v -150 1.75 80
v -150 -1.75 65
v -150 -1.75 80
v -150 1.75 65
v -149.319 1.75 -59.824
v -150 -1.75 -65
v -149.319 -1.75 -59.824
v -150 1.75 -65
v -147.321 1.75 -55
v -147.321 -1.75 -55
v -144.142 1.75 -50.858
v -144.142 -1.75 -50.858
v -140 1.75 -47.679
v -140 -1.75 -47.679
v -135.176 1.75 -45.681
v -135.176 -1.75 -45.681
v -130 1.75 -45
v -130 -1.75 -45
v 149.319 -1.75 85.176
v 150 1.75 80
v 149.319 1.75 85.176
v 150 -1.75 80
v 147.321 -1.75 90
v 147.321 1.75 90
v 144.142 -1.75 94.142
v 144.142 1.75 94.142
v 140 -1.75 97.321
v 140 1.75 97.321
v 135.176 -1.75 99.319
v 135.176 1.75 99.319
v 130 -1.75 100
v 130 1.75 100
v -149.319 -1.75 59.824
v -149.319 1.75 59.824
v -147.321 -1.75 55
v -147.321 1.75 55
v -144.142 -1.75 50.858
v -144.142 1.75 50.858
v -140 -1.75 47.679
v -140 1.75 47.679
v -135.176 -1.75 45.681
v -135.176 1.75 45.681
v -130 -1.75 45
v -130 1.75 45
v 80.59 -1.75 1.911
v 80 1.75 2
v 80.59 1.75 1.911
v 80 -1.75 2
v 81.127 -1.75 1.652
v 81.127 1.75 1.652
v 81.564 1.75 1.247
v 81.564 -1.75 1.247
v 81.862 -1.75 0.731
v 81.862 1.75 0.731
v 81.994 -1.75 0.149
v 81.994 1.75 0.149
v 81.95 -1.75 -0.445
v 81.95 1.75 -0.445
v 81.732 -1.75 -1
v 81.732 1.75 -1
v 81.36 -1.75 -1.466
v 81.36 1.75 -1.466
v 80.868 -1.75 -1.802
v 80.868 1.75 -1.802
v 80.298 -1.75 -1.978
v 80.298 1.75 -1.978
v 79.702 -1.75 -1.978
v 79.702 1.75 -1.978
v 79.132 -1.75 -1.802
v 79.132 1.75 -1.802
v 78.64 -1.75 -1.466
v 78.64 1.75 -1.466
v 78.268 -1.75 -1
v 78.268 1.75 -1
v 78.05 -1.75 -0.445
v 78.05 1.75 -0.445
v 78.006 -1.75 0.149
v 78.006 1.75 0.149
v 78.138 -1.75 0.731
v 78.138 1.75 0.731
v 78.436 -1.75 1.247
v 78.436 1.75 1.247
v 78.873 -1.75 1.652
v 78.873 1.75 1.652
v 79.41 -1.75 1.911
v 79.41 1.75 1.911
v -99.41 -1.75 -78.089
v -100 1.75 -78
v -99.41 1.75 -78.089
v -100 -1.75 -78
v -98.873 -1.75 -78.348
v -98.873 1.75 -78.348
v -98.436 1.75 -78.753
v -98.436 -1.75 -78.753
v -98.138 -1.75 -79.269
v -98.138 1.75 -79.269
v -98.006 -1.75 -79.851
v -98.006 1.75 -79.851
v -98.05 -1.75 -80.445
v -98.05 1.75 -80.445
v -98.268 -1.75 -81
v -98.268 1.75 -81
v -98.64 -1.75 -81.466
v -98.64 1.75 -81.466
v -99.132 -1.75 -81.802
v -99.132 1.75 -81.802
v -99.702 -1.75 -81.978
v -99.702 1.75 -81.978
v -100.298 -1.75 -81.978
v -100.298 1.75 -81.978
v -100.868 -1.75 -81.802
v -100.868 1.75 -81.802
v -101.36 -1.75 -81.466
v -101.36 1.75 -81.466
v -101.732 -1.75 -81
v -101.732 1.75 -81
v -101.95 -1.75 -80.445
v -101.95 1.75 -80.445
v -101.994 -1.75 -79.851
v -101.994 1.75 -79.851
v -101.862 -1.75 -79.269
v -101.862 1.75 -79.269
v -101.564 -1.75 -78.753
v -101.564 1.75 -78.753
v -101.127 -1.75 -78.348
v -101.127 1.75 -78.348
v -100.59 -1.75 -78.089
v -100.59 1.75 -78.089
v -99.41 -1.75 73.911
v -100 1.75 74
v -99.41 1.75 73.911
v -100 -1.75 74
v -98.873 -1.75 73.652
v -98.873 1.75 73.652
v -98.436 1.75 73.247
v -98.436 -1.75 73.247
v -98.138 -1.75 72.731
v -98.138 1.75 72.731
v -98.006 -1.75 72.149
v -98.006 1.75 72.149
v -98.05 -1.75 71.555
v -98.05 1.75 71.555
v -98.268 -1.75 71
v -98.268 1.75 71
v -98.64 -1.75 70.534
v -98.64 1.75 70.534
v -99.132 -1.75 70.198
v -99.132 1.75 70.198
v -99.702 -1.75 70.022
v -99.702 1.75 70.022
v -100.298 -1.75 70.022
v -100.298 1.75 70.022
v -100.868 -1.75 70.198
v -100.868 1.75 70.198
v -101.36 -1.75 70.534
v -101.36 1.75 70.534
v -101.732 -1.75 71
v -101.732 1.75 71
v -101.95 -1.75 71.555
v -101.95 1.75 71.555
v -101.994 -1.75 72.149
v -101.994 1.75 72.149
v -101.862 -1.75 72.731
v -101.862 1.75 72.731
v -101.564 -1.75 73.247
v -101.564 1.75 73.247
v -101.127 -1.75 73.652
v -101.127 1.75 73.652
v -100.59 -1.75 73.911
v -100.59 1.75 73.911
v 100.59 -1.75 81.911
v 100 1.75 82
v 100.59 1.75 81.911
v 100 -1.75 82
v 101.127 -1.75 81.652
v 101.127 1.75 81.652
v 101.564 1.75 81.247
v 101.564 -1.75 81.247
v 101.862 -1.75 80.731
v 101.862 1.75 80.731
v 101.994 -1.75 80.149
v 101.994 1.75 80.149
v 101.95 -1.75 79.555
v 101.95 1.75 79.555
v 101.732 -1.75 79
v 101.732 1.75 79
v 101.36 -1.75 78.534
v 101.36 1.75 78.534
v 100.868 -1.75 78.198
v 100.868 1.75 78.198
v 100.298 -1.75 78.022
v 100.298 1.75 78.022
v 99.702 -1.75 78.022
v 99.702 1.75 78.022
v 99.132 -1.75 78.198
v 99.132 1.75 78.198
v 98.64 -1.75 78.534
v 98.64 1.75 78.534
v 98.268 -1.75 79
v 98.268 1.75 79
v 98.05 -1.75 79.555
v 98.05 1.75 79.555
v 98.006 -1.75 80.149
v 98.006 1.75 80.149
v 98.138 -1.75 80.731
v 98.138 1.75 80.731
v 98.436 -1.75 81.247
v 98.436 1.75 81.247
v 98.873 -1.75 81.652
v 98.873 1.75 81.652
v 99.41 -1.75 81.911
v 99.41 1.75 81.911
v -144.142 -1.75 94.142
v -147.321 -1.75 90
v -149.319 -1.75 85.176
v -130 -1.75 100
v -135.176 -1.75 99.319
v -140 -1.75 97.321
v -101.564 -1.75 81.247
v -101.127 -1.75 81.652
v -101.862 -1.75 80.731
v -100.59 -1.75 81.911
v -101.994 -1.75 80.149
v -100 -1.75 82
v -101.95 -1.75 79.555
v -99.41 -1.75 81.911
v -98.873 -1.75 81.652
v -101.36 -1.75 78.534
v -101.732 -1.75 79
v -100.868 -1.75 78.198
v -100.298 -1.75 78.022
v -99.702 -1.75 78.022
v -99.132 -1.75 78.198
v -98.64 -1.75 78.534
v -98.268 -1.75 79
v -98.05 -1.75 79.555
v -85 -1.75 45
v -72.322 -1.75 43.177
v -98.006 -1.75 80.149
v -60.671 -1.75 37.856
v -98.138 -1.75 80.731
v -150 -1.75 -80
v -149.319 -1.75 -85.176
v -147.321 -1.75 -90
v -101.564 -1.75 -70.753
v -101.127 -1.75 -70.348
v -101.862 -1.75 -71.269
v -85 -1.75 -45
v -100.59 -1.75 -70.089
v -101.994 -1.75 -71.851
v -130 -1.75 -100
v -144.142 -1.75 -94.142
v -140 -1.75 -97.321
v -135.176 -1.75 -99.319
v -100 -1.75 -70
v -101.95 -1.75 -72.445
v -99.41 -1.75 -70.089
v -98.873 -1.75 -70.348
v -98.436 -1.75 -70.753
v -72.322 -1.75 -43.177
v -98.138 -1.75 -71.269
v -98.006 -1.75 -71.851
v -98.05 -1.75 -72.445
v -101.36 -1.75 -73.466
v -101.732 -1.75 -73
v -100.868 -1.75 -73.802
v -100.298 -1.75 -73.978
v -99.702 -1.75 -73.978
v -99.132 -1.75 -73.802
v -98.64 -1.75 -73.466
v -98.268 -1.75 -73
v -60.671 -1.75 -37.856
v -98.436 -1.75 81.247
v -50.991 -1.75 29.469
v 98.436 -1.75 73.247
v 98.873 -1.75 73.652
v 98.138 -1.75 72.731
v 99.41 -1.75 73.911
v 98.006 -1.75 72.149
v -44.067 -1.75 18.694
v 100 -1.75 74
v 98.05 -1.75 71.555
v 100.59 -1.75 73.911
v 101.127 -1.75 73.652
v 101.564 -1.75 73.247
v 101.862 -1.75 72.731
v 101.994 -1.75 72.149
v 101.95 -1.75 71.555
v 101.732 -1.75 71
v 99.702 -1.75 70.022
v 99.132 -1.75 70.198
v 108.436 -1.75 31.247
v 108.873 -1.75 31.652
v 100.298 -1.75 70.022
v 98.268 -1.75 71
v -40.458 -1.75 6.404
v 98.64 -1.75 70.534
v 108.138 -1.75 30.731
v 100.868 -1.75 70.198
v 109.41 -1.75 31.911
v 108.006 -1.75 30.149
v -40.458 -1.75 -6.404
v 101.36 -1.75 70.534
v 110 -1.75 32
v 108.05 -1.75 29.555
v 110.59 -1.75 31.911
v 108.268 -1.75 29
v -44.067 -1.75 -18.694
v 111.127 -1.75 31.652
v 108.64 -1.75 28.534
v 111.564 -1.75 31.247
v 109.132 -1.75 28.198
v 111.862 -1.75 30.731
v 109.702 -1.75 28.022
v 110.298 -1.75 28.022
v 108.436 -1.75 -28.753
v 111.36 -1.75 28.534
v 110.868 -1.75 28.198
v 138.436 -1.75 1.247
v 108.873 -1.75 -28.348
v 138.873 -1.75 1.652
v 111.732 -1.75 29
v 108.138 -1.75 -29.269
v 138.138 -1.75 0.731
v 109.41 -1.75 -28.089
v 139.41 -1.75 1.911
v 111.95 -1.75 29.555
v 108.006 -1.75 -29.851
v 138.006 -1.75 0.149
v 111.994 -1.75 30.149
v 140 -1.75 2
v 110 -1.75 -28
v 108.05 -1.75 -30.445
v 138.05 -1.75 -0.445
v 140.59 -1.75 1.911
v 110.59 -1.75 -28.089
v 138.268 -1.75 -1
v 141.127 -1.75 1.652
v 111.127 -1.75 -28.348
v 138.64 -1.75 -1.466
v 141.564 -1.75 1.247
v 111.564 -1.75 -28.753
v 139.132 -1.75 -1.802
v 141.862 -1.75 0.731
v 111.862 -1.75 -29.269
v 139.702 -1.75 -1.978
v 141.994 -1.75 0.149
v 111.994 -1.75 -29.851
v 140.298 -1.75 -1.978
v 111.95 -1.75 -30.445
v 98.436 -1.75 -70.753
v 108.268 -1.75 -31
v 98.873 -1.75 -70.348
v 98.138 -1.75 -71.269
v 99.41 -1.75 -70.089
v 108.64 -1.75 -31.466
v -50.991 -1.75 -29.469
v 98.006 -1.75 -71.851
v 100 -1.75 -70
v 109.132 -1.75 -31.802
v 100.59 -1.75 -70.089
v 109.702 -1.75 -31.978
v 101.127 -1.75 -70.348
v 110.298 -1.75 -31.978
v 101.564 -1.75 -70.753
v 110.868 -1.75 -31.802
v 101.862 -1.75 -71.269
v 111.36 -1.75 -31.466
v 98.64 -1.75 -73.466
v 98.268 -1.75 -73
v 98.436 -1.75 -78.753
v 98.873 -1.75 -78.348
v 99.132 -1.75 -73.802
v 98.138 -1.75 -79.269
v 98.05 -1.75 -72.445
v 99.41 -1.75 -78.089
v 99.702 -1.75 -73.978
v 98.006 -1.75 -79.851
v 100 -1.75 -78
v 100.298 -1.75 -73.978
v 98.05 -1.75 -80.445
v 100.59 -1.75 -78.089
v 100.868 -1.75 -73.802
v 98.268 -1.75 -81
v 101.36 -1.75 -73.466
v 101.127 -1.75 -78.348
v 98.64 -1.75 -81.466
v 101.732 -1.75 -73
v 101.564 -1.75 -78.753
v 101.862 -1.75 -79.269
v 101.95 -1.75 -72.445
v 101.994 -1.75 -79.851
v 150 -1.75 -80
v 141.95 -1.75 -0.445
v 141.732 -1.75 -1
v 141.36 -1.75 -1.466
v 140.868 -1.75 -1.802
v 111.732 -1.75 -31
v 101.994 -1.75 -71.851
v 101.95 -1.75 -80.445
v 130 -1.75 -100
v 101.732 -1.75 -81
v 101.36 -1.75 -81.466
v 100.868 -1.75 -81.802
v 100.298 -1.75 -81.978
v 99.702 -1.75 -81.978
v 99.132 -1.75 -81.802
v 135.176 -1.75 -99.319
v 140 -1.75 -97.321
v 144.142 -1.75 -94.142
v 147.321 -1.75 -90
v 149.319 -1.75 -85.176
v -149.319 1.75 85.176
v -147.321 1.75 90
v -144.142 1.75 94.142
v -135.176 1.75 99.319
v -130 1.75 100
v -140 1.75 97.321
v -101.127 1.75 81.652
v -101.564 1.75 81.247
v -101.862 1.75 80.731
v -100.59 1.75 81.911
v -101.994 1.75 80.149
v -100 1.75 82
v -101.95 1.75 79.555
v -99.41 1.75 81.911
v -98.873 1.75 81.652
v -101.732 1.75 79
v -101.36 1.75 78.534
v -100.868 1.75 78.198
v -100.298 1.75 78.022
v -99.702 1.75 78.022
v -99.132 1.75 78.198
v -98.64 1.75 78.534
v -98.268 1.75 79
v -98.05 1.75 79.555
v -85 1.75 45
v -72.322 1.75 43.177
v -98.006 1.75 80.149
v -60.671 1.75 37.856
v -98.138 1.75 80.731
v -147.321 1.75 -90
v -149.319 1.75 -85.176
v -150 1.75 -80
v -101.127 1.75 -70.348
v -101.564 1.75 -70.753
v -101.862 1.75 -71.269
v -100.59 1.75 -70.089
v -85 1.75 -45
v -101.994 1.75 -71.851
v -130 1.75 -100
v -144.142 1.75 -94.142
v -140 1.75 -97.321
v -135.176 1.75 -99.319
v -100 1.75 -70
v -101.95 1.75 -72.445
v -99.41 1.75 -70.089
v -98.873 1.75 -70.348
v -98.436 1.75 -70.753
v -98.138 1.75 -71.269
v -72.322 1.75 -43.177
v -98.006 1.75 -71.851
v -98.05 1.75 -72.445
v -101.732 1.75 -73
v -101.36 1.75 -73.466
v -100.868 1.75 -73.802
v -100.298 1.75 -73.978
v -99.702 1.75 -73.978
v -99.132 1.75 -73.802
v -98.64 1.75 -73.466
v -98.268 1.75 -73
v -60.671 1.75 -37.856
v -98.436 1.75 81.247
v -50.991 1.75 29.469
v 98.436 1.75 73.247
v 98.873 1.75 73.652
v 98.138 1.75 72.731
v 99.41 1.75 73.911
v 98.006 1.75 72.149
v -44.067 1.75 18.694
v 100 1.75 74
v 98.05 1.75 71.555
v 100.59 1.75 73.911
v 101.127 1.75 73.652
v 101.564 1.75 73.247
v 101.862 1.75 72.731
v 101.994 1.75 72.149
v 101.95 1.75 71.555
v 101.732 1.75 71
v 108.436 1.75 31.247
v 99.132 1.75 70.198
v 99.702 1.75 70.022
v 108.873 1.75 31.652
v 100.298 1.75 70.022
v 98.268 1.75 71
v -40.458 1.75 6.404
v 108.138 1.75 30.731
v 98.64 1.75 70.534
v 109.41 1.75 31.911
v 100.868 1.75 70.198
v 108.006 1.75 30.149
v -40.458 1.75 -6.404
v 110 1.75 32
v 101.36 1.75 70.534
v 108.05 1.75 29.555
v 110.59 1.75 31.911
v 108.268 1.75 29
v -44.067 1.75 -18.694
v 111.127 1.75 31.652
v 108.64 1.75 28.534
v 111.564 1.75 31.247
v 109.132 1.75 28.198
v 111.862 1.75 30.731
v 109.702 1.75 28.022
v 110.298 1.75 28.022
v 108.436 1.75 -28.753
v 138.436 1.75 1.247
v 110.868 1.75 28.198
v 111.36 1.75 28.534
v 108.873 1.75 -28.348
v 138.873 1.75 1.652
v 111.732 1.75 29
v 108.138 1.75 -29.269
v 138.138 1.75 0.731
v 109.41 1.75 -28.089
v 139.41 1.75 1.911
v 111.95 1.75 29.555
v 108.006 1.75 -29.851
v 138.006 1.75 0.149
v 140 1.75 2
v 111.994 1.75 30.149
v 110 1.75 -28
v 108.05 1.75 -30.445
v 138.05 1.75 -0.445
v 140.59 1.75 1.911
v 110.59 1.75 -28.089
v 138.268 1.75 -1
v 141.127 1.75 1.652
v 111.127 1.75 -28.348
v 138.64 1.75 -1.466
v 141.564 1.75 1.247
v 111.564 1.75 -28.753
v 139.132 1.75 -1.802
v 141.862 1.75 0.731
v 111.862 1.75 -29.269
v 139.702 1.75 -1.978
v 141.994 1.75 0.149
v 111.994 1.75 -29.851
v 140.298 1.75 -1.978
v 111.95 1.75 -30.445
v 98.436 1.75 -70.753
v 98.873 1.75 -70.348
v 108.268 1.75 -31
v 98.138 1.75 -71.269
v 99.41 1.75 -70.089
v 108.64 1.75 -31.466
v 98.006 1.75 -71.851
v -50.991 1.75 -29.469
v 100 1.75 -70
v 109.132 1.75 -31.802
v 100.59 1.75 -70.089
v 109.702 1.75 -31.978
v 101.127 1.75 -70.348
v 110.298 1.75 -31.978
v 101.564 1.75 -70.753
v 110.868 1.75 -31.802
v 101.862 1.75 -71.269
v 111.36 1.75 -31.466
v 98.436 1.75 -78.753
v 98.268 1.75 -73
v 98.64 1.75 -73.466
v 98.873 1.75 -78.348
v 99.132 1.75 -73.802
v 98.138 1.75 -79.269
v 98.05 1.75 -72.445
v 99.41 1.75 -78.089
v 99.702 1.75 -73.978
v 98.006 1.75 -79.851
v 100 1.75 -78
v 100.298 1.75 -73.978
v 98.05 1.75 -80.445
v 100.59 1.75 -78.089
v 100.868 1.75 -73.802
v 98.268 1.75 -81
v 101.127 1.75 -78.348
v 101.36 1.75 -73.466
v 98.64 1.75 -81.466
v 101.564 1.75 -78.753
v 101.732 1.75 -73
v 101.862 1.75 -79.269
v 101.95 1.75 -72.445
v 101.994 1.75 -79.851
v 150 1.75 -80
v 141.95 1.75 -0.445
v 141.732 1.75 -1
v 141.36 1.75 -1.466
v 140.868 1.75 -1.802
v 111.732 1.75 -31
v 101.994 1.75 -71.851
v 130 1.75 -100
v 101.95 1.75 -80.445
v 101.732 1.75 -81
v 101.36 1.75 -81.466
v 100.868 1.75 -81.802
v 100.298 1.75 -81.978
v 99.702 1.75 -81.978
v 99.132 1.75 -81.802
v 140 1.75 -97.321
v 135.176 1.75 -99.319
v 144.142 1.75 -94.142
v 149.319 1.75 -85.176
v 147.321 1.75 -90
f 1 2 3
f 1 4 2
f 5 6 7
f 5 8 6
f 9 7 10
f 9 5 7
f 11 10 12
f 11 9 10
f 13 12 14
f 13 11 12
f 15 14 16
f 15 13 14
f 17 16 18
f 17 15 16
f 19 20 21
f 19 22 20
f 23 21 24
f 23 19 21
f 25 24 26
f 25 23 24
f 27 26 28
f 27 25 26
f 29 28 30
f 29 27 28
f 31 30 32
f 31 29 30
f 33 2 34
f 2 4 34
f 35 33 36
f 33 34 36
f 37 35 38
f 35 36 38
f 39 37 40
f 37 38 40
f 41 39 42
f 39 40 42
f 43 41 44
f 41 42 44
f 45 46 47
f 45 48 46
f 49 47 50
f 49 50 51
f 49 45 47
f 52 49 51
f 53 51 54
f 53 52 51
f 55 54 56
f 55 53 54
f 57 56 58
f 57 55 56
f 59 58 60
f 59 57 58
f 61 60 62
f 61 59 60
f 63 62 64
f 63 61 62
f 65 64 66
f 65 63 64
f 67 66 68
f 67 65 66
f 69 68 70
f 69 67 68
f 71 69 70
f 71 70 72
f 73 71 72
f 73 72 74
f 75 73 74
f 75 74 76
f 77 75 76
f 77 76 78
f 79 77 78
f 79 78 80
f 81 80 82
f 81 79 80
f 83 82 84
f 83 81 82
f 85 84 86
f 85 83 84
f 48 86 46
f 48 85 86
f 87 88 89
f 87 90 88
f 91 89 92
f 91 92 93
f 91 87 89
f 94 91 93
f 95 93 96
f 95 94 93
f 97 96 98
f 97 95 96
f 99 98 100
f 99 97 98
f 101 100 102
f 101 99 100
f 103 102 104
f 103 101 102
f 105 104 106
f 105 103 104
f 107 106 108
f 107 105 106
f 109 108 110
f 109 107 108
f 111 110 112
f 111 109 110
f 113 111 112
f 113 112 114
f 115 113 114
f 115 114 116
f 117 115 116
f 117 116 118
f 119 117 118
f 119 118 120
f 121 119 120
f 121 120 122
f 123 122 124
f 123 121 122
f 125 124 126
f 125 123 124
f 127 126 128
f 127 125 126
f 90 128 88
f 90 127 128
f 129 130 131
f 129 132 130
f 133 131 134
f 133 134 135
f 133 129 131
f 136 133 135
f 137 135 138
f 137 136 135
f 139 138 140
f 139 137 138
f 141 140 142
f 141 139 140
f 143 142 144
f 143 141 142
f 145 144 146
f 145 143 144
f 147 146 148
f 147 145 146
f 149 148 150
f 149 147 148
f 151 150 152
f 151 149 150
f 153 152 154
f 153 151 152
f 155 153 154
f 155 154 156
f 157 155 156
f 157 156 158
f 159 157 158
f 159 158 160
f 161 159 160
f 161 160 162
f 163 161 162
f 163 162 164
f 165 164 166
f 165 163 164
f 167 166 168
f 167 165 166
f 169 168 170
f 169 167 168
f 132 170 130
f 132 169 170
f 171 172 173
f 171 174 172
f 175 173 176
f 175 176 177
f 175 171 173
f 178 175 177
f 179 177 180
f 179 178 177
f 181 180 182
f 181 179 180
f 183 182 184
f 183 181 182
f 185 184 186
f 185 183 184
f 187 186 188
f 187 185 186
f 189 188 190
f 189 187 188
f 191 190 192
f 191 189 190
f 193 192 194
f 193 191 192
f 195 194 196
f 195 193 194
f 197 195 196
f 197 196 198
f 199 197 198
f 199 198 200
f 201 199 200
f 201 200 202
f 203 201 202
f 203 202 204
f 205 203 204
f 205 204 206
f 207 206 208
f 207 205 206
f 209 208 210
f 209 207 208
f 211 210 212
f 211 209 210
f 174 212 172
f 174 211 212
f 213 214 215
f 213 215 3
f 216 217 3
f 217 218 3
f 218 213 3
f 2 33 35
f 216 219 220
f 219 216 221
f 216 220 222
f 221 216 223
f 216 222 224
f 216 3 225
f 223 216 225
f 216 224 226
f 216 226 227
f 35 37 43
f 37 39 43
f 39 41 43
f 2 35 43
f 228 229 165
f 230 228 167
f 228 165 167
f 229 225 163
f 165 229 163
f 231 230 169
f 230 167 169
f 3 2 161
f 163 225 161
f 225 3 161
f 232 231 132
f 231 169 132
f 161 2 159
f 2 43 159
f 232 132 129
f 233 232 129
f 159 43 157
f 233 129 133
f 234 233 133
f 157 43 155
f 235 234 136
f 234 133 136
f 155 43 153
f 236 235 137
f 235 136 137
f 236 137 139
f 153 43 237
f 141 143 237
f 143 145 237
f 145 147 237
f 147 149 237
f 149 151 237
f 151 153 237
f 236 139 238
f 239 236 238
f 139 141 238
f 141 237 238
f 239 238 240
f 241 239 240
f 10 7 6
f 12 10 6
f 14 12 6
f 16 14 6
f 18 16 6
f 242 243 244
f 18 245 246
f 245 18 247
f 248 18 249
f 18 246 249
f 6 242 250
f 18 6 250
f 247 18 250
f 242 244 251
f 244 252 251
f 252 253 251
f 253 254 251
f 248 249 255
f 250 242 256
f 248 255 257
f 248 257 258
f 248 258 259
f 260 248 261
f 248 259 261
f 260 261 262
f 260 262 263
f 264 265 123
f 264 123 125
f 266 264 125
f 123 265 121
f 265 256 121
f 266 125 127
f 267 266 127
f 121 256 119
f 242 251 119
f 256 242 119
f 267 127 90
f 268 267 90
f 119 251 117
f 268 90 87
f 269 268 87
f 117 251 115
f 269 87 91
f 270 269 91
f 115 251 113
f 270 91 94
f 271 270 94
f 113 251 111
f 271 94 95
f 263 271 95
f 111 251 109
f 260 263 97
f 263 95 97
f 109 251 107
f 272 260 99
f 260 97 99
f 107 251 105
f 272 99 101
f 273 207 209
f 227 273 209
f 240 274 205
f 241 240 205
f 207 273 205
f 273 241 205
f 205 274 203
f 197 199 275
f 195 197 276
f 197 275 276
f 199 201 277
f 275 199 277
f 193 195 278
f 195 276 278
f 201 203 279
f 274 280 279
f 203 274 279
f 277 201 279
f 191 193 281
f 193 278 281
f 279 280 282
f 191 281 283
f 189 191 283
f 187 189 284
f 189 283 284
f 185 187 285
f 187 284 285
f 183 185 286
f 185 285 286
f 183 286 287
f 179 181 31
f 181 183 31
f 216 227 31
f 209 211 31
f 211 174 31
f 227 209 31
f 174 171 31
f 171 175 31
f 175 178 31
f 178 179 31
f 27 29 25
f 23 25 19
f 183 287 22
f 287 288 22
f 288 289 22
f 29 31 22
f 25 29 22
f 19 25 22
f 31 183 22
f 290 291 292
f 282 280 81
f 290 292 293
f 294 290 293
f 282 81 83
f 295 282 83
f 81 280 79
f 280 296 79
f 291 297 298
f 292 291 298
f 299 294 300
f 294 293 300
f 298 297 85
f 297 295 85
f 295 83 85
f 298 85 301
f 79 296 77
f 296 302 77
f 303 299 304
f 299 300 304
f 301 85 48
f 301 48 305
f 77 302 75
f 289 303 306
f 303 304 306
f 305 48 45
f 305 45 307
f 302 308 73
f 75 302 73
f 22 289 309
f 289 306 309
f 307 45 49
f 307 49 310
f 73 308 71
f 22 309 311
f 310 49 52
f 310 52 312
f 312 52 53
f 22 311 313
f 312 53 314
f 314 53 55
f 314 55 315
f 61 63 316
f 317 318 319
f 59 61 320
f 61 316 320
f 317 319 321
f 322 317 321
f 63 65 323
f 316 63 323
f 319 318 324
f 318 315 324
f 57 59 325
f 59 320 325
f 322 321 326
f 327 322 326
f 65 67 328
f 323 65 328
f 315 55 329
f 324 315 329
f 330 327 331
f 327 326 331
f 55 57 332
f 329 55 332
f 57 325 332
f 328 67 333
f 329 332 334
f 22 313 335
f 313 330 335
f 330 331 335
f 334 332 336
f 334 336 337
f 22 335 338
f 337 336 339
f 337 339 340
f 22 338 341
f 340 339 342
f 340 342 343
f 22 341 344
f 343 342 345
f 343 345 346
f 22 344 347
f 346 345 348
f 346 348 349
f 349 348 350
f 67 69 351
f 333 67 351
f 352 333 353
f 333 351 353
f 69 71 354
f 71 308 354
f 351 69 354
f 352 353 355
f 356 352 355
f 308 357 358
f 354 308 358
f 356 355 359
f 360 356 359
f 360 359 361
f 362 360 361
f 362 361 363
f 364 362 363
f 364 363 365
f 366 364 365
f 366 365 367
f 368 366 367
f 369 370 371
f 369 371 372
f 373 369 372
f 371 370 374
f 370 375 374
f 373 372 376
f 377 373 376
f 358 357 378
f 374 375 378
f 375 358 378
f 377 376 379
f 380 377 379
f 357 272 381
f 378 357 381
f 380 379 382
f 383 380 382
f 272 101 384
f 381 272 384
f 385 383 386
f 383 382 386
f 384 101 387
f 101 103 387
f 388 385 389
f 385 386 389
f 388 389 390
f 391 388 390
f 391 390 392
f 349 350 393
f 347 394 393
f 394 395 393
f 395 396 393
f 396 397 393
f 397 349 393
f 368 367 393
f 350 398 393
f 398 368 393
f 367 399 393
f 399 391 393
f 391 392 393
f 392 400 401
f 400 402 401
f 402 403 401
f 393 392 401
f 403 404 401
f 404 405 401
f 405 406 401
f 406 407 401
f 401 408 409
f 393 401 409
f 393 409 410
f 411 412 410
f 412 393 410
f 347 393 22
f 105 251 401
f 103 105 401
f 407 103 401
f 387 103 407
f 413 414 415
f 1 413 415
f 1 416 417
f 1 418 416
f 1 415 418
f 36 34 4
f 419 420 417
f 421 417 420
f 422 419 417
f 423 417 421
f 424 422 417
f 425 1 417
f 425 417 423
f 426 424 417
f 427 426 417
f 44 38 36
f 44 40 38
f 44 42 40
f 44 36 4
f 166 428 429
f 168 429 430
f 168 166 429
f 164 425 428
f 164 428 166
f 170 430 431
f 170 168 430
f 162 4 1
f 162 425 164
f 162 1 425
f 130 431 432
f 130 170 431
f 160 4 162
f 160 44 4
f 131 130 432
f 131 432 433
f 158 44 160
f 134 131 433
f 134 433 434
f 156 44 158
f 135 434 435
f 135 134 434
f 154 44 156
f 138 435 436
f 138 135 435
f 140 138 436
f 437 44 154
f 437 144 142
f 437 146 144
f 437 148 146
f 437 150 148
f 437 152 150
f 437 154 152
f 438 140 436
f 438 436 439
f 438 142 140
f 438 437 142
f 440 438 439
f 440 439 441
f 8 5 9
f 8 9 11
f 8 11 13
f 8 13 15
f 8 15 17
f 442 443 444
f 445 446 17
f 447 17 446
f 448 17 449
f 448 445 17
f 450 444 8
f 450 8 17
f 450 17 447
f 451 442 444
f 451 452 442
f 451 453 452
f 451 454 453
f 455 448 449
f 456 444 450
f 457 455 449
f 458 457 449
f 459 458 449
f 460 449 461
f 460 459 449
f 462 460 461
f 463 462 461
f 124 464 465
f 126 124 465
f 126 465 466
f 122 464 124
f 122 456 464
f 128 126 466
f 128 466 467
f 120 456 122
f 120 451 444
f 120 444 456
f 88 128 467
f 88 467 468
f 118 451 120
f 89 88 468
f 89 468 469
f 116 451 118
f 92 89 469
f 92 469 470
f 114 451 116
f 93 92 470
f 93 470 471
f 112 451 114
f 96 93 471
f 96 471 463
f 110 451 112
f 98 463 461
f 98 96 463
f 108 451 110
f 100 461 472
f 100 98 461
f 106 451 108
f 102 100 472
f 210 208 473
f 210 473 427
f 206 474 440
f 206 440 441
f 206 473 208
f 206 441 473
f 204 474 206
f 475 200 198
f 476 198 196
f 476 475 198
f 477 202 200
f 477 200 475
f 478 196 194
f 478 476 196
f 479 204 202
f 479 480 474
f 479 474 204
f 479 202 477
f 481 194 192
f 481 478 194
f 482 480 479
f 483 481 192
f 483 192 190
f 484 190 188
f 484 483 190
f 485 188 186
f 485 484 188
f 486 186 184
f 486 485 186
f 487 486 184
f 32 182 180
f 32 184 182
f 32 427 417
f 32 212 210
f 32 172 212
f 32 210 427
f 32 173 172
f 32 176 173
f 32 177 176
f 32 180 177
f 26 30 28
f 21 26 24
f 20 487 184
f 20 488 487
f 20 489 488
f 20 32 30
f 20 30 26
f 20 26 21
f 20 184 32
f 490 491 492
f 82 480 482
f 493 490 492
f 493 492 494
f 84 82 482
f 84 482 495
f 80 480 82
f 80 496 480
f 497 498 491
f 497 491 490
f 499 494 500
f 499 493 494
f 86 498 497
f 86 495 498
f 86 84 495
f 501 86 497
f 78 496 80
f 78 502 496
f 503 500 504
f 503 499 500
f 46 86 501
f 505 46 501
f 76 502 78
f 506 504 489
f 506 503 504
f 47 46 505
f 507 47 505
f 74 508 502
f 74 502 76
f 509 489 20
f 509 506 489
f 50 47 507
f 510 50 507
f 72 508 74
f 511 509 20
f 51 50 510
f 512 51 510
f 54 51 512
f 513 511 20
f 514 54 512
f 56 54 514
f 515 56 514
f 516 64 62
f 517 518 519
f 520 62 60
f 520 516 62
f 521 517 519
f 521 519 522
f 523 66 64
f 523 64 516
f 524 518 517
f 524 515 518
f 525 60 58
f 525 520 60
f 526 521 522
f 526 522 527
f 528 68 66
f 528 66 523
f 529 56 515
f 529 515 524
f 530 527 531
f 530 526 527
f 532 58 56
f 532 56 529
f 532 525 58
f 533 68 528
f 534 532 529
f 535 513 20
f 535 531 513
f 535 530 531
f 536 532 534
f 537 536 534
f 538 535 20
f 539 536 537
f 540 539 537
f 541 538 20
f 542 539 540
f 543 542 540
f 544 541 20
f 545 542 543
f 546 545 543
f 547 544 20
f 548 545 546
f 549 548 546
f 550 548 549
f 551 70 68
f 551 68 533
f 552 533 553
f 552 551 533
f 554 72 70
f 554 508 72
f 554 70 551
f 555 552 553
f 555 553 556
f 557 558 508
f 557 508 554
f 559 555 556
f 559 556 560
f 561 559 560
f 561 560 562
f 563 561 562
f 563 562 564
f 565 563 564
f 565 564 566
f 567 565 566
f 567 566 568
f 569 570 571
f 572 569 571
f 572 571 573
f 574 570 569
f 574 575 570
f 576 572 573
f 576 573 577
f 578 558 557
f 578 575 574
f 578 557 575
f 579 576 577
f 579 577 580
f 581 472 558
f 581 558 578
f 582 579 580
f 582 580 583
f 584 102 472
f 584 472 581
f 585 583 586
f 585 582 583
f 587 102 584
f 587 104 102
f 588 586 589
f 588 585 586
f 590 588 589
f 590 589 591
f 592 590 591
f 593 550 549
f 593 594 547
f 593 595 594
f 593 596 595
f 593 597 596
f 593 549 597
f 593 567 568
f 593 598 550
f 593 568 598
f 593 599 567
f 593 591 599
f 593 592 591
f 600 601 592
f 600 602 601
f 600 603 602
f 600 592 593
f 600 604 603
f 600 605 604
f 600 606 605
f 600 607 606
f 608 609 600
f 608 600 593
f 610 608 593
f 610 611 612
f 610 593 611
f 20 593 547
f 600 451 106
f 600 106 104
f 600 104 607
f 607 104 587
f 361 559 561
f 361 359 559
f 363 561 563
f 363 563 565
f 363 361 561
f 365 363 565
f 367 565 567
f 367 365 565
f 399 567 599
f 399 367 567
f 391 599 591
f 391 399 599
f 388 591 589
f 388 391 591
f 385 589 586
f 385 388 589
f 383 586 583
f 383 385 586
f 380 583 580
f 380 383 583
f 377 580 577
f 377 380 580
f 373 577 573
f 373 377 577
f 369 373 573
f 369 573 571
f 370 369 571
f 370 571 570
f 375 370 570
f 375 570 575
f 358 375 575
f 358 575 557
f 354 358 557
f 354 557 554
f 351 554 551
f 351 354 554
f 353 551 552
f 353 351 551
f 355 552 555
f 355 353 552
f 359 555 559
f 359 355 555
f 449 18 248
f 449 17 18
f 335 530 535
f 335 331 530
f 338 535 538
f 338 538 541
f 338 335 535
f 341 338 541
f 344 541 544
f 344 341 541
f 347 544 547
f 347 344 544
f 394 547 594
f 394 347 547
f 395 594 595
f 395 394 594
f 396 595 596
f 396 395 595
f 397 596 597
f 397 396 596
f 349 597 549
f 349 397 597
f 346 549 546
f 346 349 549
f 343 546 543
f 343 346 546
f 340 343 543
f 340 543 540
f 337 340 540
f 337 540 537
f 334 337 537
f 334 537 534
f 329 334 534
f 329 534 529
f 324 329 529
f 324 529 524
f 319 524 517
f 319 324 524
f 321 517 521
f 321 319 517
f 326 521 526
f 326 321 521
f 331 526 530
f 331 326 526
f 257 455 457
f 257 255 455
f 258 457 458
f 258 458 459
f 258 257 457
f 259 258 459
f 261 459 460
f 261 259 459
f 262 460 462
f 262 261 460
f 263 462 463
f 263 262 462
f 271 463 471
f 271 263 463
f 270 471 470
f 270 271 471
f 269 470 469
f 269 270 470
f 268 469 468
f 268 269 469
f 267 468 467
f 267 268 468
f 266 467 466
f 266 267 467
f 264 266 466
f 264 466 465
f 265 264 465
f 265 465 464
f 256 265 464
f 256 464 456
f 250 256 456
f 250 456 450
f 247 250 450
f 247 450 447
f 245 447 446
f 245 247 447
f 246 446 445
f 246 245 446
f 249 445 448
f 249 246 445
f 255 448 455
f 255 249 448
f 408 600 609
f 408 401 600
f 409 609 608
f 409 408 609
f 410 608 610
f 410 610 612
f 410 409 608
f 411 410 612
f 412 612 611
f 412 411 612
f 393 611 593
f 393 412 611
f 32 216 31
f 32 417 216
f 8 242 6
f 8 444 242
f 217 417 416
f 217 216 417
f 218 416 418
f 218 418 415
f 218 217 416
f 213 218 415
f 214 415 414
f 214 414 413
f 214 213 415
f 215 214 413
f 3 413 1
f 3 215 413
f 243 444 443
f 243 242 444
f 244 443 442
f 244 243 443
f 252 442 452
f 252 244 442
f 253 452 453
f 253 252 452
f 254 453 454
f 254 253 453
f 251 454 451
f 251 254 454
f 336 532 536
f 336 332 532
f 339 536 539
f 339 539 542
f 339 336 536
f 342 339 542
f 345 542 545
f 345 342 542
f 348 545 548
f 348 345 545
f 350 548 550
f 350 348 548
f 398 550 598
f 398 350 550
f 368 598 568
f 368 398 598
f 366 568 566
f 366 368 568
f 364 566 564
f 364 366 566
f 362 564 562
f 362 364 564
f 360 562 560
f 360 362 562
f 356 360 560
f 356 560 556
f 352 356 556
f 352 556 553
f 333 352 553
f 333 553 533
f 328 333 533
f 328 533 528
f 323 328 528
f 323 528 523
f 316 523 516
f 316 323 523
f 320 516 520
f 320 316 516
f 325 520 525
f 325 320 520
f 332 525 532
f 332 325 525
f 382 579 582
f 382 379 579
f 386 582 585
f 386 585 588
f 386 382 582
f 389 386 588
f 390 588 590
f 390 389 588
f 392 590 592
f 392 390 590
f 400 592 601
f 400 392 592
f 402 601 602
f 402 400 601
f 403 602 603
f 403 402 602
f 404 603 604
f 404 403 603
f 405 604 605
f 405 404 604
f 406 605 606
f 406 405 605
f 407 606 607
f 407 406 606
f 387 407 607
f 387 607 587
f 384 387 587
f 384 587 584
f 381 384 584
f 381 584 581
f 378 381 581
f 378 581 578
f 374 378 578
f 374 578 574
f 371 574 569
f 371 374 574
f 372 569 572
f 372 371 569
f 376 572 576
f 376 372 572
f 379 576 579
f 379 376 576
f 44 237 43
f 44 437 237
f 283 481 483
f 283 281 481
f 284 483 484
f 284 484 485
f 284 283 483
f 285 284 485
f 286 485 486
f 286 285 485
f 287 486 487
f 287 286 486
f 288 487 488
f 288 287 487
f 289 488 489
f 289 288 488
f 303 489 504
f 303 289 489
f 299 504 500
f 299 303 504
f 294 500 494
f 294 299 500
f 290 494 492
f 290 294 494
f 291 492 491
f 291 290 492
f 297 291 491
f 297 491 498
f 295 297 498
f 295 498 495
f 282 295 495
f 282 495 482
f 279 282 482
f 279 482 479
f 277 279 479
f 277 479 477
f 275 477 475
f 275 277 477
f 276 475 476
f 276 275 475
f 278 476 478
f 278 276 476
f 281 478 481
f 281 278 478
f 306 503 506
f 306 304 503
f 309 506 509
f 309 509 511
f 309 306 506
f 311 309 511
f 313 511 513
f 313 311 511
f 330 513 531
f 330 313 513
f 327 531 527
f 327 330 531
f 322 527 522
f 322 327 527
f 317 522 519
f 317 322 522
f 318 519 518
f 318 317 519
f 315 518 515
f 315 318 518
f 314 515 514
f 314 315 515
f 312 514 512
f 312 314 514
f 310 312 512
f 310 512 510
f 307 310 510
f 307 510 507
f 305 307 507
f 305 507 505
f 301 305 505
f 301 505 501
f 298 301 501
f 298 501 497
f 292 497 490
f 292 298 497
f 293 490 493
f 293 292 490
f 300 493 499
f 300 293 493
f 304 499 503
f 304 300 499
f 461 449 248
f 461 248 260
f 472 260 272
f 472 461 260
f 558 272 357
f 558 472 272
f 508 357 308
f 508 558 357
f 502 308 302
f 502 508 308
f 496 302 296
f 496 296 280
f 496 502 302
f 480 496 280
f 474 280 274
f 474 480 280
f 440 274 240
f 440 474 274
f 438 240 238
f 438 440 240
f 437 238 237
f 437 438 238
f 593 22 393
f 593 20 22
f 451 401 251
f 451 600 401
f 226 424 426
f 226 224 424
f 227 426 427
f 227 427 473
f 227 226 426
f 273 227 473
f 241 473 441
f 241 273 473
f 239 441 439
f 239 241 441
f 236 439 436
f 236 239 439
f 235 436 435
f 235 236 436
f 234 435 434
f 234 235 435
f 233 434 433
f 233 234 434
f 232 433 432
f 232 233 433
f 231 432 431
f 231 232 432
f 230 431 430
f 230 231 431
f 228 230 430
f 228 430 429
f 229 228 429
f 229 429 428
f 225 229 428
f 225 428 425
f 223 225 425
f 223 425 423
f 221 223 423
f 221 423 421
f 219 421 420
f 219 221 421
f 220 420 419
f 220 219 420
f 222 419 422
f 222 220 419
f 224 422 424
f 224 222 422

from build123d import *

# Parameters (mm, degrees)
SKETCH1_R           = 2
BOSS_EXTRUDE1_DEPTH = 1.75
FILLET1_R           = 20


with BuildPart() as part:
    # Sketch1 → Boss-Extrude1 (new, symmetric)
    with BuildSketch(Plane(origin=(0, 0, 0), x_dir=(1, 0, 0), z_dir=(0, 1, 0))):
        with BuildLine():
            Line((-150, 100), (-150, 45))
            Line((-150, 45), (-85, 45))
            ThreePointArc((-85, 45), (-40, 0), (-85, -45))
            Line((-85, -45), (-150, -45))
            Line((-150, -45), (-150, -100))
            Line((-150, -100), (150, -100))
            Line((150, -100), (150, 100))
            Line((150, 100), (-150, 100))
        make_face()
        with Locations(Location((-100, 80, 0), (0, 0, 270))):
            Circle(SKETCH1_R, mode=Mode.SUBTRACT)
        with Locations(Location((100, 80, 0), (0, 0, 270))):
            Circle(SKETCH1_R, mode=Mode.SUBTRACT)
        with Locations(Location((100, -80, 0), (0, 0, 270))):
            Circle(SKETCH1_R, mode=Mode.SUBTRACT)
        with Locations(Location((-100, -80, 0), (0, 0, 270))):
            Circle(SKETCH1_R, mode=Mode.SUBTRACT)
        with Locations(Location((-100, 72, 0), (0, 0, 270))):
            Circle(SKETCH1_R, mode=Mode.SUBTRACT)
        with Locations(Location((100, 72, 0), (0, 0, 270))):
            Circle(SKETCH1_R, mode=Mode.SUBTRACT)
        with Locations(Location((100, -72, 0), (0, 0, 270))):
            Circle(SKETCH1_R, mode=Mode.SUBTRACT)
        with Locations(Location((-100, -72, 0), (0, 0, 270))):
            Circle(SKETCH1_R, mode=Mode.SUBTRACT)
        with Locations(Location((110, 30, 0), (0, 0, 270))):
            Circle(SKETCH1_R, mode=Mode.SUBTRACT)
        with Locations(Location((140, 0, 0), (0, 0, 270))):
            Circle(SKETCH1_R, mode=Mode.SUBTRACT)
        with Locations(Location((110, -30, 0), (0, 0, 270))):
            Circle(SKETCH1_R, mode=Mode.SUBTRACT)
        with Locations(Location((80, 0, 0), (0, 0, 270))):
            Circle(SKETCH1_R, mode=Mode.SUBTRACT)
    extrude(amount=BOSS_EXTRUDE1_DEPTH, both=True)

    # Fillet1
    fillet1_edges = [part.edges().sort_by_distance(p)[0] for p in [
        (150, 0, 100),
        (-150, 0, 100),
        (-150, 0, 45),
        (-150, 0, -45),
        (-150, 0, -100),
        (150, 0, -100),
    ]]
    fillet(fillet1_edges, radius=FILLET1_R)


solid = part.part
